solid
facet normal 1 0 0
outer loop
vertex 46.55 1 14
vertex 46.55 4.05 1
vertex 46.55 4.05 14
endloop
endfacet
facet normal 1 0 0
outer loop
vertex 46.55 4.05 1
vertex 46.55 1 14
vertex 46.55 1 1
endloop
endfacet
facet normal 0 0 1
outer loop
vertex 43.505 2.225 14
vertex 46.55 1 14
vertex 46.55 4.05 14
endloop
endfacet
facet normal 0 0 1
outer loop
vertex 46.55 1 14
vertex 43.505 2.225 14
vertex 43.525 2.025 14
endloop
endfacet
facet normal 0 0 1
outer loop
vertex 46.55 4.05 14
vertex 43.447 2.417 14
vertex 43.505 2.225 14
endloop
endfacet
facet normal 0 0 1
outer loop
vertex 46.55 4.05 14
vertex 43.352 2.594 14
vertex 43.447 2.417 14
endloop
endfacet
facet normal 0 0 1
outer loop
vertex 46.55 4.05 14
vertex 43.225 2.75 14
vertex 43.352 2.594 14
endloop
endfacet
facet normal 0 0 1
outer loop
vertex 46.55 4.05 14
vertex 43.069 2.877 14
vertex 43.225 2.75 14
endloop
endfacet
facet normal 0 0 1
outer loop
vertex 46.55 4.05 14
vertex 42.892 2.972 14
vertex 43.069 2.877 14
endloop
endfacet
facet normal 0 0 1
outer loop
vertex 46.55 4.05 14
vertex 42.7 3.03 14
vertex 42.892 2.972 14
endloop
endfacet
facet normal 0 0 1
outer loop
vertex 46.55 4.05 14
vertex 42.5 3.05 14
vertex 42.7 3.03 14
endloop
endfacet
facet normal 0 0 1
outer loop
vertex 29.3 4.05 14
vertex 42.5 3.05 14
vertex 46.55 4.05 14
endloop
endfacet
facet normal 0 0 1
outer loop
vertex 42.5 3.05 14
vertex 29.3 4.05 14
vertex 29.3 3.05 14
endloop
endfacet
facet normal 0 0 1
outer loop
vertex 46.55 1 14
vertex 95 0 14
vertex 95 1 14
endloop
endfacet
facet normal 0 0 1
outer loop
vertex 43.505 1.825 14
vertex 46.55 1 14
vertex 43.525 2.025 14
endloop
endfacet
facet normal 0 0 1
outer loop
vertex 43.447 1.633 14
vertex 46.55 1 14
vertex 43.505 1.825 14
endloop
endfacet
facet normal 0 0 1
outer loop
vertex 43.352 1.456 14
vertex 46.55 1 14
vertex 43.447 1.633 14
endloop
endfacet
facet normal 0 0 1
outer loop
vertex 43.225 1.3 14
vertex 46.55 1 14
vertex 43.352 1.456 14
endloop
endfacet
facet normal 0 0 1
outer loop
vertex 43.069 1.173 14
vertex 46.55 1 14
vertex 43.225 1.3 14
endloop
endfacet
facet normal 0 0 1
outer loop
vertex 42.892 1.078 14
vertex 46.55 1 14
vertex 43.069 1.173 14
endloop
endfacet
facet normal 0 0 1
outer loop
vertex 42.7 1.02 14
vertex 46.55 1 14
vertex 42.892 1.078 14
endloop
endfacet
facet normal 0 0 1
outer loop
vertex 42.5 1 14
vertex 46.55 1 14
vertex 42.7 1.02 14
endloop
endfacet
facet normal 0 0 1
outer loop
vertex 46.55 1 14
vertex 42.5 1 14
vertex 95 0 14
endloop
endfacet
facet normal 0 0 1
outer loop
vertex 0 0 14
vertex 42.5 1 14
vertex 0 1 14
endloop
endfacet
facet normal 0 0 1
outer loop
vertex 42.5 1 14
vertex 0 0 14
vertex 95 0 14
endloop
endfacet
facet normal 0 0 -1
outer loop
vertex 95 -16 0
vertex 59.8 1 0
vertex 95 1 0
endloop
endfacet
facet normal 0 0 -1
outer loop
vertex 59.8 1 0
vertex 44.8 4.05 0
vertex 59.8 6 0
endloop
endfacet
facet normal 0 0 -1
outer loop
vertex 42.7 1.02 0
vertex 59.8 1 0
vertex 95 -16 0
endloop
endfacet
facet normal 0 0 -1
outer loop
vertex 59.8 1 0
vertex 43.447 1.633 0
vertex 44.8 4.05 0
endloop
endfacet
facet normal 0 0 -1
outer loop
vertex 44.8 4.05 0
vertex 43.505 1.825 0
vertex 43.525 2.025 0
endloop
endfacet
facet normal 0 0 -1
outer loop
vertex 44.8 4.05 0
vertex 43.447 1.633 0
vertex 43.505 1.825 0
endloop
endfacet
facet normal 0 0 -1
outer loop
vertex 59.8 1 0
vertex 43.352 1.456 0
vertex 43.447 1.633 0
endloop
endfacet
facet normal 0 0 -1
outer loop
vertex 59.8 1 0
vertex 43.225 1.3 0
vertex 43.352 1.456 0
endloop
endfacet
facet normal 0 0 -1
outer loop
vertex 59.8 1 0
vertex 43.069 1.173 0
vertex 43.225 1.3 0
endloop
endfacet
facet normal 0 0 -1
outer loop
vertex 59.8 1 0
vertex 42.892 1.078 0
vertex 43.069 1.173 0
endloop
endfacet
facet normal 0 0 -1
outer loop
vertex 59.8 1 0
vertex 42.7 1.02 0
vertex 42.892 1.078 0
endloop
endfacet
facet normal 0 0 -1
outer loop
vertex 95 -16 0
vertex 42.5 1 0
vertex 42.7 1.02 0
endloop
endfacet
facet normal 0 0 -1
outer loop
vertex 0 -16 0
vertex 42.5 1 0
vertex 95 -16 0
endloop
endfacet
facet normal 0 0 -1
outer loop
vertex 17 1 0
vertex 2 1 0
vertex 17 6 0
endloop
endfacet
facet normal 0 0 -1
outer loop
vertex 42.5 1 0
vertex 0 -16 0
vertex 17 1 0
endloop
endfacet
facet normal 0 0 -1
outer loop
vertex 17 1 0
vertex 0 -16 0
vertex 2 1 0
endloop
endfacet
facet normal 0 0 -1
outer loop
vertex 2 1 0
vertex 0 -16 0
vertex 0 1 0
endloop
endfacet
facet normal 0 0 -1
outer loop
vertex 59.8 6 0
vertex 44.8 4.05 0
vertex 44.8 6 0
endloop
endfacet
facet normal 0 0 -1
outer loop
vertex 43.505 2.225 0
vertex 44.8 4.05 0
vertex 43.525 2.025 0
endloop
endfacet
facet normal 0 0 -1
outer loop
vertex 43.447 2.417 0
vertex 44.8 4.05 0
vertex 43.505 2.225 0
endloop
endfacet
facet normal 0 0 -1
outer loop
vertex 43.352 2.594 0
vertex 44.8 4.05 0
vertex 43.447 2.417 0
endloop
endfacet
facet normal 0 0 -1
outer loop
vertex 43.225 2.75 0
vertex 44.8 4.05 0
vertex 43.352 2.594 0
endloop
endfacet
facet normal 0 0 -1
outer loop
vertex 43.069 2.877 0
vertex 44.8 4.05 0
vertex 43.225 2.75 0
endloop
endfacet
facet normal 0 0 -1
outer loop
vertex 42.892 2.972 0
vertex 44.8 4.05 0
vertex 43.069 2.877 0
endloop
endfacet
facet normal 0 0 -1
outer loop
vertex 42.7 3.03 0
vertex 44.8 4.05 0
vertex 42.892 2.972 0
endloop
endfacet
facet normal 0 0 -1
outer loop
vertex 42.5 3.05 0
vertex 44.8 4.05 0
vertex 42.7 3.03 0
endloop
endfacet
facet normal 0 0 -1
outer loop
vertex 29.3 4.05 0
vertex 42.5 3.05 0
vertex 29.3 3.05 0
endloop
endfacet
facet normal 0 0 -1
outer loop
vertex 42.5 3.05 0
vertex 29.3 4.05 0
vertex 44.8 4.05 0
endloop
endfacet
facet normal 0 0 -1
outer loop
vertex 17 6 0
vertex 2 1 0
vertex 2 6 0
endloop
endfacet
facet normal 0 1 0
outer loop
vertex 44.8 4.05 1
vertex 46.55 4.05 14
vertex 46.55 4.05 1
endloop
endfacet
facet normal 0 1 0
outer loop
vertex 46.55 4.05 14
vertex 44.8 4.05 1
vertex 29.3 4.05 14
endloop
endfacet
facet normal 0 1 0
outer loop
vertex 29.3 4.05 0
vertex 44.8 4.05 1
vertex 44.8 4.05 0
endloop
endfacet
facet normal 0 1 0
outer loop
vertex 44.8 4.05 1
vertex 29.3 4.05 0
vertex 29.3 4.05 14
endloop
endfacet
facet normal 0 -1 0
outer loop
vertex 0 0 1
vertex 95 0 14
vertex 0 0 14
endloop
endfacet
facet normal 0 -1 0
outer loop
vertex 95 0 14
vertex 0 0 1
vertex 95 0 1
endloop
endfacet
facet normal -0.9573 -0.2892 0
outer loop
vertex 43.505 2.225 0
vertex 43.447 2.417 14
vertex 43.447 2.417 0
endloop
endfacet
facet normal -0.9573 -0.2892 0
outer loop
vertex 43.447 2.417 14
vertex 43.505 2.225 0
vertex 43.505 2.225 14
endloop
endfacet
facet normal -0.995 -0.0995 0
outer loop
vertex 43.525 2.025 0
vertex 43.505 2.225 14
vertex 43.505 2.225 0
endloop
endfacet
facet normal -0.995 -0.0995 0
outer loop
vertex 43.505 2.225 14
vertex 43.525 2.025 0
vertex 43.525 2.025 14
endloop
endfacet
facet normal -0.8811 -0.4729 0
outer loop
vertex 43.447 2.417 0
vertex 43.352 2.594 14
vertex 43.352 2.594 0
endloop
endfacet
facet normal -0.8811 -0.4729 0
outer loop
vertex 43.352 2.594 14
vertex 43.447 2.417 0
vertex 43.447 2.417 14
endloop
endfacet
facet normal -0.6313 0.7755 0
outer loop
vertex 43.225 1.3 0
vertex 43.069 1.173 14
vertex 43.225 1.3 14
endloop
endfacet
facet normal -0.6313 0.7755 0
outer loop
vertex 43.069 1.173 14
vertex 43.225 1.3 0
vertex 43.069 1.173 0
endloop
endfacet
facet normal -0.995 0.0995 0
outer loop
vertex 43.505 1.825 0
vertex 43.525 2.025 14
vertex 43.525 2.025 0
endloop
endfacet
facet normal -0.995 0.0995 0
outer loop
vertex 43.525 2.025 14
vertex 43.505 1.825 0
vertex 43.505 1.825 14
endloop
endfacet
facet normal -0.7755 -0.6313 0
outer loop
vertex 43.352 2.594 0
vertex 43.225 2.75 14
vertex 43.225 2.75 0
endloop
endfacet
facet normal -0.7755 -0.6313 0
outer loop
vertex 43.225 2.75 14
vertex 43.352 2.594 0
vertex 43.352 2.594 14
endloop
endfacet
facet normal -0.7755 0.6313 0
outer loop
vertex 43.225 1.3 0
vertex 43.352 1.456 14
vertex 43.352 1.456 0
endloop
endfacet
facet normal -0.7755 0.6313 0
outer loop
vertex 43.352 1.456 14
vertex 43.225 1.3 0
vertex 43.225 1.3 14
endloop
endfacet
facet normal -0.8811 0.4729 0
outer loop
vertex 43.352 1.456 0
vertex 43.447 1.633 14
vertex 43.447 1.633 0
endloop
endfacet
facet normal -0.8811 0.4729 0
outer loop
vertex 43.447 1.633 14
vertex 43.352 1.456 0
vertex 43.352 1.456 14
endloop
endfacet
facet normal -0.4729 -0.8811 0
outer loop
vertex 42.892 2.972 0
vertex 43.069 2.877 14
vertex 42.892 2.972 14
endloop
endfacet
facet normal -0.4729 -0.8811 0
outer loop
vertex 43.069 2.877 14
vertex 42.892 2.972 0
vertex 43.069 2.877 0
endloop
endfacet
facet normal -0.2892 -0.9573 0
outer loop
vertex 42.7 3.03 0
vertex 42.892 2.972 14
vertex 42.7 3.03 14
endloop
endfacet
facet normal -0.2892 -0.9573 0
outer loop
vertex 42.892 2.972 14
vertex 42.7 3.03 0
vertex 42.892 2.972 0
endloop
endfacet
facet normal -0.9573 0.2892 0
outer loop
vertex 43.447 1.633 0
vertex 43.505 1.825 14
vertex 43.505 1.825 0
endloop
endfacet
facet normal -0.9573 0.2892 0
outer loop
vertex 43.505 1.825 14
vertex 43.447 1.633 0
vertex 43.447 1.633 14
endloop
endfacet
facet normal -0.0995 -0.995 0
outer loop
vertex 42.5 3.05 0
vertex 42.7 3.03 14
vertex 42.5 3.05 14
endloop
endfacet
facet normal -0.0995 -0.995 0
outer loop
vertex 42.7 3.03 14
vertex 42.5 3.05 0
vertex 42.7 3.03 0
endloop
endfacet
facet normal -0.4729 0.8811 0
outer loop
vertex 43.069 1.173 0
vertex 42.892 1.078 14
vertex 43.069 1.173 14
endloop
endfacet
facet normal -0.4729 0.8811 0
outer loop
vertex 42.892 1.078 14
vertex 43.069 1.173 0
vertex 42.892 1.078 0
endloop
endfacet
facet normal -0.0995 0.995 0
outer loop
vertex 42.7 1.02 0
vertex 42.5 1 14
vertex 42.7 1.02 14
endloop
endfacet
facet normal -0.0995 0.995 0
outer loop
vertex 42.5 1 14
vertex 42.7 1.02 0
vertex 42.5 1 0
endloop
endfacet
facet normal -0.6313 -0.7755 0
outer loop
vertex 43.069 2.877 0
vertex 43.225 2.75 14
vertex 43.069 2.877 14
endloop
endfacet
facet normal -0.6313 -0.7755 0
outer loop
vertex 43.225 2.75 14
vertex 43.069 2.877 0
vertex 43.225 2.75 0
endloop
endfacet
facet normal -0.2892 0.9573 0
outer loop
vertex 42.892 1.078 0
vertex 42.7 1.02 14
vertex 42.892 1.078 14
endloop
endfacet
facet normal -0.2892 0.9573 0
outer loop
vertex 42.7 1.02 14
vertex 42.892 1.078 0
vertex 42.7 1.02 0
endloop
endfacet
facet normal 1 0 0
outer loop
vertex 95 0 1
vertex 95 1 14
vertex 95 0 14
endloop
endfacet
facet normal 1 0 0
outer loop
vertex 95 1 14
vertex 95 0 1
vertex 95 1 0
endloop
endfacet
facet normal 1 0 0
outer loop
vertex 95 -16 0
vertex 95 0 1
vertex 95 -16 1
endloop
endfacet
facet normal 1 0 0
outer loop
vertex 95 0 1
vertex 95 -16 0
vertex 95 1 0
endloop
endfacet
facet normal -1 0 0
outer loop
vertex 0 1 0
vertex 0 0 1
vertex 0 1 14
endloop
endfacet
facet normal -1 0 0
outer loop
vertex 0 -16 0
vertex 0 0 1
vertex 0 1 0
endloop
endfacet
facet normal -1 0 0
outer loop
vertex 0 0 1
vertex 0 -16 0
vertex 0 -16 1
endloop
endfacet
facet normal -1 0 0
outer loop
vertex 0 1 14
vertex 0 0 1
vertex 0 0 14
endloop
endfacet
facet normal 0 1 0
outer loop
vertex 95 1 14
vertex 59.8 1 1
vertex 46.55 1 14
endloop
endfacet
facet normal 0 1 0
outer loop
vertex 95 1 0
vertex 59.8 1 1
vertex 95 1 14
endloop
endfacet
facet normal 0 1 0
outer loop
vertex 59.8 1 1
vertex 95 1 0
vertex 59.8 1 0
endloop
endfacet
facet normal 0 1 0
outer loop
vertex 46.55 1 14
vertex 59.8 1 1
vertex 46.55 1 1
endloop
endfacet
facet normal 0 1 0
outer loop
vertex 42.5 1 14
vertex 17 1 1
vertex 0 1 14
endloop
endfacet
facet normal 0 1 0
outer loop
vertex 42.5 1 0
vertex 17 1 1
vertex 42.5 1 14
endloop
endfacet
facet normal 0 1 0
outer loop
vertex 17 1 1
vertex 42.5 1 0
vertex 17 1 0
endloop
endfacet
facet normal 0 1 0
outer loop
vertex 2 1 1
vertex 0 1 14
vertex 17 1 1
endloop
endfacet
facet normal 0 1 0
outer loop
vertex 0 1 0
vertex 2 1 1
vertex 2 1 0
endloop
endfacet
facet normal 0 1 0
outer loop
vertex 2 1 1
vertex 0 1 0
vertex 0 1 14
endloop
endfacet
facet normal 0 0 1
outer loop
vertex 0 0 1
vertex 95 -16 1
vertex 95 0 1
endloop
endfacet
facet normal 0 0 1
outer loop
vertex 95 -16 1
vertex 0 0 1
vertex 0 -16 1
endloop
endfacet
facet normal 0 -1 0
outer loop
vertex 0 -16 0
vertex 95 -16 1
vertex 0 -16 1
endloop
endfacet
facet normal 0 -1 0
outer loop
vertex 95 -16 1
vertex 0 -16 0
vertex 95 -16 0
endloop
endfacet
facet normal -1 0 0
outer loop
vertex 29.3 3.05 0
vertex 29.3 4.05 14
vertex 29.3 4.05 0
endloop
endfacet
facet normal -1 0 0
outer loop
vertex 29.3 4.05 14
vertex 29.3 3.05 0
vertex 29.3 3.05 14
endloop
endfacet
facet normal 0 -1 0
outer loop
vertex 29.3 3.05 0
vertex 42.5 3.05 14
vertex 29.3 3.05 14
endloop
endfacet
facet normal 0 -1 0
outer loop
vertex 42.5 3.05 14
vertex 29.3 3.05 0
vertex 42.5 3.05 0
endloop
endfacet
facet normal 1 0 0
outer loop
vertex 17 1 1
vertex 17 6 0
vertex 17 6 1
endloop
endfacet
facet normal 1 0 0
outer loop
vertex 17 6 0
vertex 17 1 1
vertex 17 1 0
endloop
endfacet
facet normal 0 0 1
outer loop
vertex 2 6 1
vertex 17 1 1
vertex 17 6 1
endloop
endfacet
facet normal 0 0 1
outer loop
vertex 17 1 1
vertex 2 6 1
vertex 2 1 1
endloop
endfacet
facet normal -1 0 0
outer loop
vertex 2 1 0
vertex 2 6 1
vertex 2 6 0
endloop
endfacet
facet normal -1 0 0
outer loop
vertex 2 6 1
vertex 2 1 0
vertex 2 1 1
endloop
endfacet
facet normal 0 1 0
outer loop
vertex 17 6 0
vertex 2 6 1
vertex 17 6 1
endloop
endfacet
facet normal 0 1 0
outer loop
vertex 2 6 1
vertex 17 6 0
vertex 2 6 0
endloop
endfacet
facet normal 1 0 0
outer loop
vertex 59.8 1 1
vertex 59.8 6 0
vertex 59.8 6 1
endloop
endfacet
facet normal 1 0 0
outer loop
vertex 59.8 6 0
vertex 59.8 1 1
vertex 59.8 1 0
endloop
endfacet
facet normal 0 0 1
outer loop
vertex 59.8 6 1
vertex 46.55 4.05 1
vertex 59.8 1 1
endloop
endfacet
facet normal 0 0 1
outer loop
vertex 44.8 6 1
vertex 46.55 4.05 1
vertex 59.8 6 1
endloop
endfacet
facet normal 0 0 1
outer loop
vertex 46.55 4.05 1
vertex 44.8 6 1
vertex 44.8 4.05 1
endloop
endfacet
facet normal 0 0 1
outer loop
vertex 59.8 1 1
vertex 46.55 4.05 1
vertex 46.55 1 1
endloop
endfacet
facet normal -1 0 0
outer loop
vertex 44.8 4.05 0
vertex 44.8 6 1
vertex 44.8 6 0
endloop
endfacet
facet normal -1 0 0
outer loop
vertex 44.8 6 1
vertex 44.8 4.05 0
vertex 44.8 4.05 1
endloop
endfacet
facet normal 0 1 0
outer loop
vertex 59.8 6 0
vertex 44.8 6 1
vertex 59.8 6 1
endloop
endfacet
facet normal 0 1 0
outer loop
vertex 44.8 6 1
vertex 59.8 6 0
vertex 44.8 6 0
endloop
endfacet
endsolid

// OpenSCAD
//////////////////////////////////////////////////////////////////////////////////////
///
///  FLEXBATTER: Flexing battery holder with built-in spring
///
///  This file generates battery holders for arbitrary cylindrical sizes.
///  The number of batteries and their size is fully parametrized.
///
///  The usual metallic spring at the minus pole is replaced by a
///  flexible printed spring, which is pressing the contacts firmly to 
///  the battery.
///
///  The contacts for the plus and minus pole can easily be made by
///  a few windings of the uninsulated ends of the connecting wires.
///  Each battery compartment contains are several holes to the outside
///  as well ad to the neighboring compartments, through which connecting
///  wires can be passed for easy configuring of parallel, serial or
///  balanced-serial battery packs.
///  
///  The preconfigured battery sizes are:
///  AA, AAA, C, D, 18650(Li-Ion), 18650P(protected Li-Ion), CR123A(16340)
///  
///  Given that the printed plastic spring needs to be flexible, ABS is the material
///  of choice here.
///
//////////////////////////////////////////////////////////////////////////////////////
///
///  2014-09-09 Heinz Spiess, Switzerland
///
///  released under Creative Commons - Attribution - Share Alike licence (CC BY-SA)
//////////////////////////////////////////////////////////////////////////////////////

// build a cube with chamfered edges
module chamfered_cube(size,d=1){
   hull(){
     translate([d,d,0])cube(size-2*[d,d,0]);
     translate([0,d,d])cube(size-2*[0,d,d]);
     translate([d,0,d])cube(size-2*[d,0,d]);
   }
}


// draw an arc width height h between radius r1..r2 and angles a1..a2
module arc(r1,r2,h,a1=0,a2=0){
     if(a2-a1<=180){
        difference(){
           cylinder(r=r2,h=h);
           translate([0,0,-1])cylinder(r=r1,h=h+2);
	   rotate(a2)translate([-r1-r2,0,-1])cube([2*(r1+r2),2*(r1+r2),h+2]);
	   rotate(a1+180)translate([-r1-r2,0,-1])cube([2*(r1+r2),2*(r1+r2),h+2]);
        }
     } else {
           difference(){
              cylinder(r=r2,h=h);
              translate([0,0,-1])cylinder(r=r1,h=h+2);
              intersection(){
	       rotate(a2)translate([-r1-r2,0,-1])cube([2*(r1+r2),2*(r1+r2),h+2]);
	       rotate(a1+180)translate([-r1-r2,0,-1])cube([2*(r1+r2),2*(r1+r2),h+2]);
	      }
           }
     }
}

/////////////////////////////////////////////////////////////////////////////////
// sline - generate a "snake line" of width w and height h 
// with a arbitrary sequence of segments defined by a radius and a turning angle
//
//   angle[i] > 0  left turn / counter-clockwise
//   angle[i] < 0  left turn / clockwise
//   angle[i] = 0  straight segment with length radius[i]
//
/////////////////////////////////////////////////////////////////////////////////
// Heinz Spiess, 2014-09-06 (CC BY-SA)
/////////////////////////////////////////////////////////////////////////////////
module sline(angle,radius,i,w,h){
   scale([angle[i]>=0?1:-1,1,1])
      assign(r=abs(radius[i]))assign(a=angle[i])
         translate([a?r:0,0,0]){
	    translate([-w/2,-r-0.01,0])cube([w,0.02,h]); // tiny overlap!
            if(a)arc(r-w/2,r+w/2,0,a,h=h);
	    else if(r>0)translate([-w/2,-r,0])cube([w,r,h]);
      if(i+1<len(angle))
           rotate(angle[i])
	      translate([a?-r:0,a?0:-r,0])
	         sline(angle,radius,i+1,w,h);
  }
}

//////////////////////////////////////////////////////////////////////////////////
//
//  FLEXBATTER:  Flexing battery holder with integrated plastic spring
//
//////////////////////////////////////////////////////////////////////////////////
module flexbatter(n=1,l=65,d=18,hf=0.75,r=4,shd=3,eps=0.28,el=0,xchan=[1/4,3/4],$fn=24){
ew=0.56;   // extrusion width
eh=0.25;   // extrusion height
w = 4*ew;  // case wall thickness
ws = 2*ew; // spring wall thickness
ch = w-ws; // edge chamfering
deepen=0; //deepening for side grip of batteries
//el = 0;  // extra length in spring
//eps = 0.28;
//shd = 3; // screw hole diameter
//hf=0.75;
//xchan=[1/4,3/4]; // relative position of traversal wire channels

r = d/5+2*ws; // linear spring length (depends on sline() call!)

   for(i=[0:n-1])translate([0,i*(d+w+ws),0]){ // generate n battery cases
      difference(){
         
         union(){
            difference(){
               // main body
               translate([0,-w-d/2,0])
	          chamfered_cube([l+w,d+2*w+(i<n-1?ws:0),hf*d+w+ch],ch);
	       // main cavity
               translate([-2,-d/2,w])cube([2+l,d,d+1]);
	       // cavity for locating plastic spring
               translate([-1,-d/2,-1])cube([2,d,d+w+2]);
	       // small cylindrical carving of walls and bottom
	       if(eps>0)translate([-1,0,d/2+w])rotate([0,90,0])cylinder(r=d/2+eps,h=l+1);
            }
      
            // plastic spring for minus pole
            for(sy=[-1,1])scale([1,sy,1])assign(D=d+2*w-2*ws-0.7){
               translate([ch,d/2+w-ws/2,0])rotate(-90)
		  //sline([90,0,120,90,120,90,0],[d/8+2,d/6,d/8-1,d/8,-d/8,d/8,d/2],0,ws,hf*d+w);
		  sline([0,180,0,180,0,-180,0,90,0],[r+ch+el,D/4,el,D/12,el/2,D/12,1+el/2,D/5,D/3],0,ws,hf*d+w);


            }
         }
      
         // lower and upper holes for contacts
         for(z=[-2*ws,2*ws])
            translate([-2*ws,-w,w-ws/2+d/2+z])cube([l+2*w+2,2*w,ws]);
      
         // longitudinal bottom wire channel
         translate([-2*ws,0,0])rotate([0,90,0])cylinder(r=w/2,h=l+w+2+r,$fn=5);
      
         // traversal bottom wire channels
         for(x=l*xchan)translate([x,-d/2-w-1,eh]) rotate([-90,0,0])cylinder(r=w/2,h=d+2*w+ws+2,$fn=6);
   
         // grip deepening
	 if(deepen>0)
            translate([w+l/2-0.5,-d/2-w-0.01,w+d+l])
	       rotate([-90,0,0]){
	          cylinder(r=l+deepen*d,h=d+2*w+2*ws+2,$fn=72);
	          if(i==0)cylinder(r1=l+deepen*d+ch,r2=l+deepen*d,h=ch+0.02,$fn=72);
	          if(i==n-1)translate([0,0,d+2*w-ch])cylinder(r2=l+deepen*d+ch,r1=l+deepen*d,h=ch+0.02,$fn=72);

               }
         // conical screw holes in corners
         for(x=[7+shd,l-2*shd])for(y=[-d/2+shd,d/2-shd])
             translate([x,y,-1]){
                cylinder(r=shd/2,h=w+2);
                translate([0,0,w-shd/2+1])cylinder(r1=shd/2,r2=shd,h=shd/2+0.01);
             }

         // holes for wires passing inside
         for(sy=[-1,1])scale([1,sy,1]){
	    translate([l-1,-d/2,w])cube([w+2,2,2]);
            for(x=[3,l-7])translate([x,-d/2-w-ws-1,w])cube([3,w+ws+3,2]); 
            translate([3,-d/2+w/2-0.75,-1])cube([3,1.5,w+2]); 
            translate([-0.5,-d/2+w/2,0])rotate([0,90,0])cylinder(r=w/2,h=6.5,$fn=5);
         }

         // engrave battery symbol
	 translate([w+l/2,d/4+1,w])cube([l/5,d/4.5,4*eh],true);
	 translate([w+l/2+l/10,d/4+1,w])cube([d/7,d/10,4*eh],true);
	 // engrave plus symbol
	 assign(sy=(l>12*shd)?1:-1){ // for short batteries +- on the side
	    translate([w+l/2+l/(sy>0?5:10),sy*(d/4+1),w]){
	       cube([1,d/4,4*eh],true);
	       cube([d/4,1,4*eh],true);
            }
	 // engrave minus symbol
	    translate([w+l/2-l/(sy>0?5:10),sy*(d/4+1),w])
	       cube([1,d/4,4*eh],true);
         }
   
         //correction for middle separators
         //if(i<n-1) translate([-d,d/2+w-ws/2,-1])cube([d,ws/2+0.1,d+2]);
	 //else translate([1,d/2+w,-0.01])cylinder(r1=ch,r2=0,h=ch);
         //if(i>0) translate([-d,-d/2-w-0.1,-1])cube([d,ws/2+0.1,d+2]);
	 //else translate([1,-d/2-w,-0.01])cylinder(r1=ch,r2=0,h=ch);


      }


      // horizontal contact bulges (+ and - pole)
      for(x=[-0.3,l])
         hull()for(y=[-3+el,3-el])
            translate([x,y,w+d/2])sphere(r=ws);
   
      // vertical contact bulge (+ pole only)
      if(0)hull()for(z=[-3+el,3-el])for(x=[0,w-ws])
            translate([l+x,0,w+d/2+z])sphere(r=ws);



   }

}

module flexbatter18650(n=1){
   flexbatter(n=n,l=65.5,d=18.4,hf=0.75,shd=3,eps=0.28);
}  

module flexbatter18650P(n=1){
   flexbatter(n=n,l=67.5,d=18.4,hf=0.75,shd=3,eps=0.28);
}  

module flexbatterCR123A(n=1){
   flexbatter(n=n,l=35.1,d=16.7,hf=0.75,shd=3,xchan=[0.5],eps=0.28);
}  

module flexbatterD(n=1){
   flexbatter(n=n,l=61.5,d=34.0,hf=0.75,shd=3,eps=0.28);
}  

module flexbatterC(n=1){
   flexbatter(n=n,l=51.6,d=26.4,hf=0.75,shd=3,eps=0.28);
}  

module flexbatterAA(n=1){
   flexbatter(n=n,l=51.6,d=14.4,hf=0.80,shd=2.5,el=0.5,eps=0.28);
}  

module flexbatterAAA(n=1){
   flexbatter(n=n,l=46.1,d=10.45,hf=0.84,shd=2,el=1,xchan=[0.5],eps=0);
}  

module flexbatter18650x1(){ // AUTO_MAKE_STL
  flexbatter18650(n=1);
}

module flexbatter18650Px1(){ // AUTO_MAKE_STL
  flexbatter18650P(n=1);
}

module flexbatterCR123Ax1(){ // AUTO_MAKE_STL
  flexbatterCR123A(n=1);
}

module flexbatterAAx1(){ // AUTO_MAKE_STL
  flexbatterAA(n=1);
}

module flexbatterAAAx1(){ // AUTO_MAKE_STL
  flexbatterAAA(n=1);
}

module flexbatterCx1(){ // AUTO_MAKE_STL
  flexbatterC(n=1);
}

module flexbatter18650x2(){ // AUTO_MAKE_STL
  flexbatter18650(n=2);
}

module flexbatterAAx2(){ // AUTO_MAKE_STL
  flexbatterAA(n=2);
}

module flexbatterAAAx2(){ // AUTO_MAKE_STL
  flexbatterAAA(n=2);
}

module flexbatterCx2(){ // AUTO_MAKE_STL
  flexbatterC(n=2);
}

module flexbatter18650x3(){ // AUTO_MAKE_STL
  flexbatter18650(n=3);
}

module flexbatterAAx3(){ // AUTO_MAKE_STL
  flexbatterAA(n=3);
}

module flexbatterAAAx3(){ // AUTO_MAKE_STL
  flexbatterAAA(n=3);
}

module flexbatter18650x4(){ // AUTO_MAKE_STL
  flexbatter18650(n=4);
}

module flexbatterAAx4(){ // AUTO_MAKE_STL
  flexbatterAA(n=4);
}

module flexbatterAAAx4(){ // AUTO_MAKE_STL
  flexbatterAAA(n=4);
}

module rackhook(){
  raillen=75;
  xtraraillen=20;
  railh=14;
  railth=1;
  restde=16;
  pegw=11;
  pegth=1.95;//1.8
  flapw=30;
  flaph=14;
  flapth=railth;
  hookth=flapth;
  hookw=pegw*1.2;
  hookgap=pegth+0.1;
  spineth=flapth+hookgap+hookth;
  xofs=-10;


	//rail
	cube([raillen+xtraraillen,railth,railh]);
  //extrarail front
	//rest
	translate([0,-restde,0]) cube([raillen+xtraraillen,restde,1]);
  //outer plate
  translate([(raillen/2-flapw/2),0,0]) cube([flapw,flapth,flaph]);
  //hook
  translate([(raillen/2-flapw/2)+flapw-hookw+xofs,flapth+hookgap,0]) cube([hookw,flapth,flaph]);

	difference(){
	   union(){		
		  //spine of hook 
		  translate([(raillen/2+flapw/2)+xofs,0,0]) cube([spineth,spineth,flaph]);
	   }//union
	 //rounder of spine
	 translate([(raillen/2+flapw/2)+xofs,railth+hookgap/2,-0.05]) cylinder(d=hookgap,h=flaph+0.1,$fn=32);
  }//difference
  //inflaps 
  flapofs1=2;  
  flapofs2=hookw+2;
  flaplen=raillen*0.2;
  flapde=5;//restde*0.4;
	translate([flapofs1,railth,0]) cube([flaplen,flapde,railth]);
	translate([raillen-flapofs2-flaplen,railth,0]) cube([flaplen,flapde,railth]);
}
rackhook();
//mirror ([0,1,0]) rackhook();

// uncomment as needed:

//flexbatterCR123A(n=2);
//rotate([0,0,0])translate([0,0,-9])flexbatter18650(n=1);
//translate([0,40,0])rotate([90,0,0])translate([0,0,-9])flexbatter18650(n=1);
//translate([0,80,0])rotate([180,0,0])translate([0,0,-9])flexbatter18650(n=1);
//translate([0,120,0])rotate([-90,0,0])translate([0,0,-9])flexbatter18650(n=1);
//translate([0,33,0])flexbatter18650(n=2);
//translate([0,90,0])flexbatter18650(n=3);
//translate([-90,33,0])flexbatter18650(n=4);
//translate([0,28,0])flexbatterAA(n=2);
//translate([0,50,0])flexbatterAAA(n=1);
//flexbatterC(n=1);
//flexbatterD(n=1);
